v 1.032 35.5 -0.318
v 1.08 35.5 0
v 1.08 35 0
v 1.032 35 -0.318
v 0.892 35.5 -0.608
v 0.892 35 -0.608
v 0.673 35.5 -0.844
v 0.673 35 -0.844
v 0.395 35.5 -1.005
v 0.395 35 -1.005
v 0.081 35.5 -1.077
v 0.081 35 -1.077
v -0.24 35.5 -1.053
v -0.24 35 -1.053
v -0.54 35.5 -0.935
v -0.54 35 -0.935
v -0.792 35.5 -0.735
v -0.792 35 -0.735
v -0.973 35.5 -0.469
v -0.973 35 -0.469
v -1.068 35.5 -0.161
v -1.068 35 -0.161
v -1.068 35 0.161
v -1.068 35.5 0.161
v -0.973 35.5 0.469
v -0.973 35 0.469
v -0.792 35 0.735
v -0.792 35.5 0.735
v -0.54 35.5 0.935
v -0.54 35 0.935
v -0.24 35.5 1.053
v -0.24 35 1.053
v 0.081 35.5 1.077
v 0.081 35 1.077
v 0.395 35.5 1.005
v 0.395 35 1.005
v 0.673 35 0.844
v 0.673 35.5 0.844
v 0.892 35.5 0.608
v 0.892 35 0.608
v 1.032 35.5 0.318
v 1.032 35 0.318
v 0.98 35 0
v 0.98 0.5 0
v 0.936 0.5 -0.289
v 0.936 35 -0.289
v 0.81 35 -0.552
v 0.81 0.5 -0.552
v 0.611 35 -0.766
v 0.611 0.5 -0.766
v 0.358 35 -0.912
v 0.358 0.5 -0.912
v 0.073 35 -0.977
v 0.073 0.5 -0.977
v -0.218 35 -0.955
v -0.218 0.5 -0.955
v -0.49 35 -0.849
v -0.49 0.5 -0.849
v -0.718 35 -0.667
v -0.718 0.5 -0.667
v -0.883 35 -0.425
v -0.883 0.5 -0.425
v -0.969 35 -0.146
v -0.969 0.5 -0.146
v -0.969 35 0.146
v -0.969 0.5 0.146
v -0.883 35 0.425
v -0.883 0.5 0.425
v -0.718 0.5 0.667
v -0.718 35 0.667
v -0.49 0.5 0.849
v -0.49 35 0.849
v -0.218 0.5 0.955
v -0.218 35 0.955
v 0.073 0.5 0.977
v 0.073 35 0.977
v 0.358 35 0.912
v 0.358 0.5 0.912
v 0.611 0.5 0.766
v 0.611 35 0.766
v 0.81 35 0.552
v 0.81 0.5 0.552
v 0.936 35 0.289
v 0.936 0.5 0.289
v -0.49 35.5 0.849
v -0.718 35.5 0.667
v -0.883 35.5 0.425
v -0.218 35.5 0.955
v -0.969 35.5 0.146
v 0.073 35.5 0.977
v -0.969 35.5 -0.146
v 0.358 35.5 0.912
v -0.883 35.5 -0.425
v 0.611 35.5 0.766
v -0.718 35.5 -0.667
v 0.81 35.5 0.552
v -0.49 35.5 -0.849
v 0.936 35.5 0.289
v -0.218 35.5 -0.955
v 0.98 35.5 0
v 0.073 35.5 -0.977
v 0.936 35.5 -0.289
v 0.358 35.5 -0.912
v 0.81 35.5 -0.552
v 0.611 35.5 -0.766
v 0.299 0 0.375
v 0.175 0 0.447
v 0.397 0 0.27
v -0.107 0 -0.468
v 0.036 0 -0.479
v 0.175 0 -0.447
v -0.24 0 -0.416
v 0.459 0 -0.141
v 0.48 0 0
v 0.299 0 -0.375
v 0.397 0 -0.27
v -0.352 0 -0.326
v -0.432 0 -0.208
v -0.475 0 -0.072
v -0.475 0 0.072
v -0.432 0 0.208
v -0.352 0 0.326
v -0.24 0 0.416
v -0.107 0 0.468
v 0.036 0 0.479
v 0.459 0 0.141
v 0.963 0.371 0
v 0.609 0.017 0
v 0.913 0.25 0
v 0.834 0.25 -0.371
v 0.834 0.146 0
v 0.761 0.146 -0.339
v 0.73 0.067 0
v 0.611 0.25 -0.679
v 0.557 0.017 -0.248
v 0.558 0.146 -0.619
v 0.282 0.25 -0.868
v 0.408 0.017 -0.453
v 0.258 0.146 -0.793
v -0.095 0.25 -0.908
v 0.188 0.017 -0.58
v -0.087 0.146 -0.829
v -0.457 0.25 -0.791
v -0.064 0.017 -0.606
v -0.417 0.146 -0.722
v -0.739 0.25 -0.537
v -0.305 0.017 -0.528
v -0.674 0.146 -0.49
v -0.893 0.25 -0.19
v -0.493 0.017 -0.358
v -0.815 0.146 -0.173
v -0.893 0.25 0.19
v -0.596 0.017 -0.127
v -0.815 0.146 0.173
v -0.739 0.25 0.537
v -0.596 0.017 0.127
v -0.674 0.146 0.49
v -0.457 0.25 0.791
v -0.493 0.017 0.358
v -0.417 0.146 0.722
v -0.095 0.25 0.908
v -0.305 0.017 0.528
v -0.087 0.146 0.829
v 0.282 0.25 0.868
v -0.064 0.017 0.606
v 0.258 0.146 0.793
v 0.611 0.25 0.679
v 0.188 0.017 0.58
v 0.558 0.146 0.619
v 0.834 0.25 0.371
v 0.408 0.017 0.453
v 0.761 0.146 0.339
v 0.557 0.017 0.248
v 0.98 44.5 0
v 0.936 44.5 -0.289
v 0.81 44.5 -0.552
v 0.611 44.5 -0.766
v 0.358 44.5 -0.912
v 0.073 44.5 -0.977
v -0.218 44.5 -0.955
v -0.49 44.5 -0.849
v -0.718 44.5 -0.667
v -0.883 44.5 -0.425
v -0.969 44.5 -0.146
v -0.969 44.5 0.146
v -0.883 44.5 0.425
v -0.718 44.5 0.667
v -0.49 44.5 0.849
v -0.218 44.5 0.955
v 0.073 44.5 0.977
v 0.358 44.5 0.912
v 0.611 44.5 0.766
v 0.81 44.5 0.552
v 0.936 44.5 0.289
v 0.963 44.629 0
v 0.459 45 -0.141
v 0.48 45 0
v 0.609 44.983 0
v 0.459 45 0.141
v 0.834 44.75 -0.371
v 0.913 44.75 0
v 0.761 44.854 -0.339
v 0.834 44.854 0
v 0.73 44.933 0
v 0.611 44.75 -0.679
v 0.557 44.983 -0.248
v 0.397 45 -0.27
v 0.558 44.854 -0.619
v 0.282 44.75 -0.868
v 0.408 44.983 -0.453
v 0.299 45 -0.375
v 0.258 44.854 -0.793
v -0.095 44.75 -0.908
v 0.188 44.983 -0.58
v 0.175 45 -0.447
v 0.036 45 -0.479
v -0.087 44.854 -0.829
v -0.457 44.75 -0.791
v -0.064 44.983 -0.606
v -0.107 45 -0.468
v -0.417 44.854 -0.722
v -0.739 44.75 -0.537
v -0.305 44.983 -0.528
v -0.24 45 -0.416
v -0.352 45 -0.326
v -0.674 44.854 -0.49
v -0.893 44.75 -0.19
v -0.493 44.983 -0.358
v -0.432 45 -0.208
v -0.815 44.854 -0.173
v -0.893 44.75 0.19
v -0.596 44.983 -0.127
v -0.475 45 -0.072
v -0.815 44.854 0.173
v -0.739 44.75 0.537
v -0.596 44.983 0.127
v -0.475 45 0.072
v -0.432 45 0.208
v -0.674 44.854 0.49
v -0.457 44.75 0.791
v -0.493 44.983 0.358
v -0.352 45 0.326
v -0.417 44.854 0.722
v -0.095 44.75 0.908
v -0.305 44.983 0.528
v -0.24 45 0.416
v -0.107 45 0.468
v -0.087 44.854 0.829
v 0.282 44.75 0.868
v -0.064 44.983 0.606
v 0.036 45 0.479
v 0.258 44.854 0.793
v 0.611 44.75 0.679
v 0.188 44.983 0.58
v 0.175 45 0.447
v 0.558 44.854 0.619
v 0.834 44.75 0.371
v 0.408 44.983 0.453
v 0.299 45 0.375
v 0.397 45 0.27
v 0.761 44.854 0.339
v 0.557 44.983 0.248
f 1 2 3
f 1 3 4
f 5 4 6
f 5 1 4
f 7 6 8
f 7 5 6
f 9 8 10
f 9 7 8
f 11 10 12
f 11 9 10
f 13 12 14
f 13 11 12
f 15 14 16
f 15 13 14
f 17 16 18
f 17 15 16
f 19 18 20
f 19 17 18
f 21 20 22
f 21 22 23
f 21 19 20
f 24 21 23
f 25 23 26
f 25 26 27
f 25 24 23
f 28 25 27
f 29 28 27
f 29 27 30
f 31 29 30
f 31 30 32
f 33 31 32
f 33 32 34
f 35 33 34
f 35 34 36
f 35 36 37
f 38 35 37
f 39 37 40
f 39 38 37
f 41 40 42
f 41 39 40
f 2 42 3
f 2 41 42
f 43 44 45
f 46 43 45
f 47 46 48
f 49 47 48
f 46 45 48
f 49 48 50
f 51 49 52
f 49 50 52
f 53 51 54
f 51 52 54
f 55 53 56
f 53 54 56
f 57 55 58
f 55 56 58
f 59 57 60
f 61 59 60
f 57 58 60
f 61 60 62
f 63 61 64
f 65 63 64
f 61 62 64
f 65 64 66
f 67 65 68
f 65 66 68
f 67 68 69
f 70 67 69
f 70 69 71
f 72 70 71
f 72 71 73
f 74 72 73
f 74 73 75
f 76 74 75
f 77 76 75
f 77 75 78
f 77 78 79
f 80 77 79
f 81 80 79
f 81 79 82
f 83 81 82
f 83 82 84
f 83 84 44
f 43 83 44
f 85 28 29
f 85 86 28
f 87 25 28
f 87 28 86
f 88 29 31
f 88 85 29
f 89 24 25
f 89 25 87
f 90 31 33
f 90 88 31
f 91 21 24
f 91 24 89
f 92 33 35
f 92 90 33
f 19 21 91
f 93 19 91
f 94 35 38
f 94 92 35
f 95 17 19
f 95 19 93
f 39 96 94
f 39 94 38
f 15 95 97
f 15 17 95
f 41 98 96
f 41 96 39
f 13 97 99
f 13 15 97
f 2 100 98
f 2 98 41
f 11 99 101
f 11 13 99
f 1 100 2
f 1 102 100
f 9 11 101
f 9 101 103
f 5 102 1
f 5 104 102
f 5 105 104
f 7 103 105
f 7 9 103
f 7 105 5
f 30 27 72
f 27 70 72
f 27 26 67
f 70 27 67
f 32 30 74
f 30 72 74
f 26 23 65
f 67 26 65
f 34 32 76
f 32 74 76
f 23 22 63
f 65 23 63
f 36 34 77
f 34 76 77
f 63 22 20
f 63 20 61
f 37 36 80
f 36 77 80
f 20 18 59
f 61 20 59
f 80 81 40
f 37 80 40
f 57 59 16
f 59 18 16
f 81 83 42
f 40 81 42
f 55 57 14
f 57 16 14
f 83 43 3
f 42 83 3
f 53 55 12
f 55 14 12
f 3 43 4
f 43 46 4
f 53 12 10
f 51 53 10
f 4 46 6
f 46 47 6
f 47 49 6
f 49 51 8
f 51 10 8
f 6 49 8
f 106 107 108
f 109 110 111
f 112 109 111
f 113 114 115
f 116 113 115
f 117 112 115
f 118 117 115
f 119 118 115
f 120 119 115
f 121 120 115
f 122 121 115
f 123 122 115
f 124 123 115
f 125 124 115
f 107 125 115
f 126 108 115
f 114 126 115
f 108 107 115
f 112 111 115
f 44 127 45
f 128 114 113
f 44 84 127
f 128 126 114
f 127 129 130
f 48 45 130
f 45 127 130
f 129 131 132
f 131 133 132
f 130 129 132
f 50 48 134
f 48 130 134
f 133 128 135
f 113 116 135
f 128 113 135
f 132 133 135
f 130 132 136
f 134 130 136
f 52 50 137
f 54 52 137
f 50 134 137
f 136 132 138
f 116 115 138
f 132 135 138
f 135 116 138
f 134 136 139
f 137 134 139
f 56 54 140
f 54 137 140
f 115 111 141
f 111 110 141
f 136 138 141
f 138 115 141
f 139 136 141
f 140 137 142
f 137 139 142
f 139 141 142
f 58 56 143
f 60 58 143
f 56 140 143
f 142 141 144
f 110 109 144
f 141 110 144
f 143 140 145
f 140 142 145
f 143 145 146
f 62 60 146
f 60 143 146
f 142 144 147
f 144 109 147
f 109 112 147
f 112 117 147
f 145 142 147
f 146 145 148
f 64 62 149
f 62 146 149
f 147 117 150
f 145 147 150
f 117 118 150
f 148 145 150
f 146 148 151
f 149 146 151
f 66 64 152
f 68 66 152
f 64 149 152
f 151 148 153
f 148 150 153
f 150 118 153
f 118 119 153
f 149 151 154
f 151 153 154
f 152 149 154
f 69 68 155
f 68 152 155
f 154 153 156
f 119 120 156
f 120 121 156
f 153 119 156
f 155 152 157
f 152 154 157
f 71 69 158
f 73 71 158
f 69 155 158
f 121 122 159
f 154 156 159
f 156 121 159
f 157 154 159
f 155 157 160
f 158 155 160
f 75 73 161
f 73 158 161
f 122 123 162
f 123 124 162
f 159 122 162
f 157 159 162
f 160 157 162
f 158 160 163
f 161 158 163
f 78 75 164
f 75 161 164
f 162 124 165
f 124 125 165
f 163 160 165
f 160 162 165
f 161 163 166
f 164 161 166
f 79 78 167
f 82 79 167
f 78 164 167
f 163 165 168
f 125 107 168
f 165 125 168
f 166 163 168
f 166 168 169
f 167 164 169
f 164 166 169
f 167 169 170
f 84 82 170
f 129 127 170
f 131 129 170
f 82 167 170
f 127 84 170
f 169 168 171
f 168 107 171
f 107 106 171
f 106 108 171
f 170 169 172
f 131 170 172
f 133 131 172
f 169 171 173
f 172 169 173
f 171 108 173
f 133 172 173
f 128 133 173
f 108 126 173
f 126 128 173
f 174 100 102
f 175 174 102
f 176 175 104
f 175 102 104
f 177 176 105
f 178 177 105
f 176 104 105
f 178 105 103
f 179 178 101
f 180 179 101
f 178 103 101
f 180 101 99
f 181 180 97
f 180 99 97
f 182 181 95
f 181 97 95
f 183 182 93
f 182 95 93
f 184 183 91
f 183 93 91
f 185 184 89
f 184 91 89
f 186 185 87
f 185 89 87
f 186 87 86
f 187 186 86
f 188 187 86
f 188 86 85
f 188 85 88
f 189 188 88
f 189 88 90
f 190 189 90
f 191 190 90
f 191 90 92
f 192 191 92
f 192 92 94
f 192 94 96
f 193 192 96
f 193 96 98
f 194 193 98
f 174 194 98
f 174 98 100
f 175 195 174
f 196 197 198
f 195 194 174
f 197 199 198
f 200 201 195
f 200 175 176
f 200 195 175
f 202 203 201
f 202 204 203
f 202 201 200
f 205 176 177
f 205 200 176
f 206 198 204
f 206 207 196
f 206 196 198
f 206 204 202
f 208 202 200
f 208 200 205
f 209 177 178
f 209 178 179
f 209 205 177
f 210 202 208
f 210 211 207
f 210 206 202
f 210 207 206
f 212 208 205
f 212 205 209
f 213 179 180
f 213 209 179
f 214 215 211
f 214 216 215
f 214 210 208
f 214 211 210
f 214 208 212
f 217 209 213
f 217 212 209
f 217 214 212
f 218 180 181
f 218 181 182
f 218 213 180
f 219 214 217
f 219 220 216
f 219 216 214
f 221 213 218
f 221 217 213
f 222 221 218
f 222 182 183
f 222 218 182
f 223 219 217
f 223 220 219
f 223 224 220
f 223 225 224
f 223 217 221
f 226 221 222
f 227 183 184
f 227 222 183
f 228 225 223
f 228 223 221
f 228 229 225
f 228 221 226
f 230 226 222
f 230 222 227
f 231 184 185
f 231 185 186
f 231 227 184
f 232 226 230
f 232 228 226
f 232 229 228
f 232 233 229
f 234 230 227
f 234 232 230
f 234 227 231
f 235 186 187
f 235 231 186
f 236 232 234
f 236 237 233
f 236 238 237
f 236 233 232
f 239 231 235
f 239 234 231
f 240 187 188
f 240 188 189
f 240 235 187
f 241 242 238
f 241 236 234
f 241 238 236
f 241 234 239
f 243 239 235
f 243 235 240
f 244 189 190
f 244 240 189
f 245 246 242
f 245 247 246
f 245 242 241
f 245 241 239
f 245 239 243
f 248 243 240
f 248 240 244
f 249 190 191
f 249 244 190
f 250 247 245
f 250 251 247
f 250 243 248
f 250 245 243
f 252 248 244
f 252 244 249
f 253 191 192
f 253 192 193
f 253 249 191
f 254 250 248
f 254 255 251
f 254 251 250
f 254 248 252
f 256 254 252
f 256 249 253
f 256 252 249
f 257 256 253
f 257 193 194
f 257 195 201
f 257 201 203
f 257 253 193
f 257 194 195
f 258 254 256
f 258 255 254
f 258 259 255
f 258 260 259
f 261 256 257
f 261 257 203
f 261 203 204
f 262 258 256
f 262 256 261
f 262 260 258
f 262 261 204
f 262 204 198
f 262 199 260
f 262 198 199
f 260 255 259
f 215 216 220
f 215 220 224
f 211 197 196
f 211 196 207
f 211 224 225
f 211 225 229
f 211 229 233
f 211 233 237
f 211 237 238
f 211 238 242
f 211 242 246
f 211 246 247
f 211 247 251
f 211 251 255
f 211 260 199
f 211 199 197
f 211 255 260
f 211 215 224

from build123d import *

# Parameters (mm, degrees)
SKETCH_1_R        = 0.98
EXTRUDE_1_DEPTH   = 45
FILLET_1_R        = 0.5
SKETCH_2_R        = 1.08
SKETCH_2_R_2      = 0.98
EXTRUDE_1_2_DEPTH = 0.5


with BuildPart() as part:
    # 草图1 → Extrude 1 (new body)
    with BuildSketch(Plane(origin=(0, 0, 0), x_dir=(1, 0, 0), z_dir=(0, 1, 0))):
        Circle(SKETCH_1_R)
    extrude(amount=EXTRUDE_1_DEPTH)

    # 圆角1
    fillet_1_edges = [part.edges().sort_by_distance(p)[0] for p in [
        (-0.98, 0, 0),
        (-0.98, 45, 0),
    ]]
    fillet(fillet_1_edges, radius=FILLET_1_R)

    # 草图2 → Extrude 1 2 (add)
    with BuildSketch(Plane(origin=(0, 35.5, 0), x_dir=(1, 0, 0), z_dir=(0, 1, 0))):
        Circle(SKETCH_2_R)
        Circle(SKETCH_2_R_2, mode=Mode.SUBTRACT)
    extrude(amount=-EXTRUDE_1_2_DEPTH)


solid = part.part
